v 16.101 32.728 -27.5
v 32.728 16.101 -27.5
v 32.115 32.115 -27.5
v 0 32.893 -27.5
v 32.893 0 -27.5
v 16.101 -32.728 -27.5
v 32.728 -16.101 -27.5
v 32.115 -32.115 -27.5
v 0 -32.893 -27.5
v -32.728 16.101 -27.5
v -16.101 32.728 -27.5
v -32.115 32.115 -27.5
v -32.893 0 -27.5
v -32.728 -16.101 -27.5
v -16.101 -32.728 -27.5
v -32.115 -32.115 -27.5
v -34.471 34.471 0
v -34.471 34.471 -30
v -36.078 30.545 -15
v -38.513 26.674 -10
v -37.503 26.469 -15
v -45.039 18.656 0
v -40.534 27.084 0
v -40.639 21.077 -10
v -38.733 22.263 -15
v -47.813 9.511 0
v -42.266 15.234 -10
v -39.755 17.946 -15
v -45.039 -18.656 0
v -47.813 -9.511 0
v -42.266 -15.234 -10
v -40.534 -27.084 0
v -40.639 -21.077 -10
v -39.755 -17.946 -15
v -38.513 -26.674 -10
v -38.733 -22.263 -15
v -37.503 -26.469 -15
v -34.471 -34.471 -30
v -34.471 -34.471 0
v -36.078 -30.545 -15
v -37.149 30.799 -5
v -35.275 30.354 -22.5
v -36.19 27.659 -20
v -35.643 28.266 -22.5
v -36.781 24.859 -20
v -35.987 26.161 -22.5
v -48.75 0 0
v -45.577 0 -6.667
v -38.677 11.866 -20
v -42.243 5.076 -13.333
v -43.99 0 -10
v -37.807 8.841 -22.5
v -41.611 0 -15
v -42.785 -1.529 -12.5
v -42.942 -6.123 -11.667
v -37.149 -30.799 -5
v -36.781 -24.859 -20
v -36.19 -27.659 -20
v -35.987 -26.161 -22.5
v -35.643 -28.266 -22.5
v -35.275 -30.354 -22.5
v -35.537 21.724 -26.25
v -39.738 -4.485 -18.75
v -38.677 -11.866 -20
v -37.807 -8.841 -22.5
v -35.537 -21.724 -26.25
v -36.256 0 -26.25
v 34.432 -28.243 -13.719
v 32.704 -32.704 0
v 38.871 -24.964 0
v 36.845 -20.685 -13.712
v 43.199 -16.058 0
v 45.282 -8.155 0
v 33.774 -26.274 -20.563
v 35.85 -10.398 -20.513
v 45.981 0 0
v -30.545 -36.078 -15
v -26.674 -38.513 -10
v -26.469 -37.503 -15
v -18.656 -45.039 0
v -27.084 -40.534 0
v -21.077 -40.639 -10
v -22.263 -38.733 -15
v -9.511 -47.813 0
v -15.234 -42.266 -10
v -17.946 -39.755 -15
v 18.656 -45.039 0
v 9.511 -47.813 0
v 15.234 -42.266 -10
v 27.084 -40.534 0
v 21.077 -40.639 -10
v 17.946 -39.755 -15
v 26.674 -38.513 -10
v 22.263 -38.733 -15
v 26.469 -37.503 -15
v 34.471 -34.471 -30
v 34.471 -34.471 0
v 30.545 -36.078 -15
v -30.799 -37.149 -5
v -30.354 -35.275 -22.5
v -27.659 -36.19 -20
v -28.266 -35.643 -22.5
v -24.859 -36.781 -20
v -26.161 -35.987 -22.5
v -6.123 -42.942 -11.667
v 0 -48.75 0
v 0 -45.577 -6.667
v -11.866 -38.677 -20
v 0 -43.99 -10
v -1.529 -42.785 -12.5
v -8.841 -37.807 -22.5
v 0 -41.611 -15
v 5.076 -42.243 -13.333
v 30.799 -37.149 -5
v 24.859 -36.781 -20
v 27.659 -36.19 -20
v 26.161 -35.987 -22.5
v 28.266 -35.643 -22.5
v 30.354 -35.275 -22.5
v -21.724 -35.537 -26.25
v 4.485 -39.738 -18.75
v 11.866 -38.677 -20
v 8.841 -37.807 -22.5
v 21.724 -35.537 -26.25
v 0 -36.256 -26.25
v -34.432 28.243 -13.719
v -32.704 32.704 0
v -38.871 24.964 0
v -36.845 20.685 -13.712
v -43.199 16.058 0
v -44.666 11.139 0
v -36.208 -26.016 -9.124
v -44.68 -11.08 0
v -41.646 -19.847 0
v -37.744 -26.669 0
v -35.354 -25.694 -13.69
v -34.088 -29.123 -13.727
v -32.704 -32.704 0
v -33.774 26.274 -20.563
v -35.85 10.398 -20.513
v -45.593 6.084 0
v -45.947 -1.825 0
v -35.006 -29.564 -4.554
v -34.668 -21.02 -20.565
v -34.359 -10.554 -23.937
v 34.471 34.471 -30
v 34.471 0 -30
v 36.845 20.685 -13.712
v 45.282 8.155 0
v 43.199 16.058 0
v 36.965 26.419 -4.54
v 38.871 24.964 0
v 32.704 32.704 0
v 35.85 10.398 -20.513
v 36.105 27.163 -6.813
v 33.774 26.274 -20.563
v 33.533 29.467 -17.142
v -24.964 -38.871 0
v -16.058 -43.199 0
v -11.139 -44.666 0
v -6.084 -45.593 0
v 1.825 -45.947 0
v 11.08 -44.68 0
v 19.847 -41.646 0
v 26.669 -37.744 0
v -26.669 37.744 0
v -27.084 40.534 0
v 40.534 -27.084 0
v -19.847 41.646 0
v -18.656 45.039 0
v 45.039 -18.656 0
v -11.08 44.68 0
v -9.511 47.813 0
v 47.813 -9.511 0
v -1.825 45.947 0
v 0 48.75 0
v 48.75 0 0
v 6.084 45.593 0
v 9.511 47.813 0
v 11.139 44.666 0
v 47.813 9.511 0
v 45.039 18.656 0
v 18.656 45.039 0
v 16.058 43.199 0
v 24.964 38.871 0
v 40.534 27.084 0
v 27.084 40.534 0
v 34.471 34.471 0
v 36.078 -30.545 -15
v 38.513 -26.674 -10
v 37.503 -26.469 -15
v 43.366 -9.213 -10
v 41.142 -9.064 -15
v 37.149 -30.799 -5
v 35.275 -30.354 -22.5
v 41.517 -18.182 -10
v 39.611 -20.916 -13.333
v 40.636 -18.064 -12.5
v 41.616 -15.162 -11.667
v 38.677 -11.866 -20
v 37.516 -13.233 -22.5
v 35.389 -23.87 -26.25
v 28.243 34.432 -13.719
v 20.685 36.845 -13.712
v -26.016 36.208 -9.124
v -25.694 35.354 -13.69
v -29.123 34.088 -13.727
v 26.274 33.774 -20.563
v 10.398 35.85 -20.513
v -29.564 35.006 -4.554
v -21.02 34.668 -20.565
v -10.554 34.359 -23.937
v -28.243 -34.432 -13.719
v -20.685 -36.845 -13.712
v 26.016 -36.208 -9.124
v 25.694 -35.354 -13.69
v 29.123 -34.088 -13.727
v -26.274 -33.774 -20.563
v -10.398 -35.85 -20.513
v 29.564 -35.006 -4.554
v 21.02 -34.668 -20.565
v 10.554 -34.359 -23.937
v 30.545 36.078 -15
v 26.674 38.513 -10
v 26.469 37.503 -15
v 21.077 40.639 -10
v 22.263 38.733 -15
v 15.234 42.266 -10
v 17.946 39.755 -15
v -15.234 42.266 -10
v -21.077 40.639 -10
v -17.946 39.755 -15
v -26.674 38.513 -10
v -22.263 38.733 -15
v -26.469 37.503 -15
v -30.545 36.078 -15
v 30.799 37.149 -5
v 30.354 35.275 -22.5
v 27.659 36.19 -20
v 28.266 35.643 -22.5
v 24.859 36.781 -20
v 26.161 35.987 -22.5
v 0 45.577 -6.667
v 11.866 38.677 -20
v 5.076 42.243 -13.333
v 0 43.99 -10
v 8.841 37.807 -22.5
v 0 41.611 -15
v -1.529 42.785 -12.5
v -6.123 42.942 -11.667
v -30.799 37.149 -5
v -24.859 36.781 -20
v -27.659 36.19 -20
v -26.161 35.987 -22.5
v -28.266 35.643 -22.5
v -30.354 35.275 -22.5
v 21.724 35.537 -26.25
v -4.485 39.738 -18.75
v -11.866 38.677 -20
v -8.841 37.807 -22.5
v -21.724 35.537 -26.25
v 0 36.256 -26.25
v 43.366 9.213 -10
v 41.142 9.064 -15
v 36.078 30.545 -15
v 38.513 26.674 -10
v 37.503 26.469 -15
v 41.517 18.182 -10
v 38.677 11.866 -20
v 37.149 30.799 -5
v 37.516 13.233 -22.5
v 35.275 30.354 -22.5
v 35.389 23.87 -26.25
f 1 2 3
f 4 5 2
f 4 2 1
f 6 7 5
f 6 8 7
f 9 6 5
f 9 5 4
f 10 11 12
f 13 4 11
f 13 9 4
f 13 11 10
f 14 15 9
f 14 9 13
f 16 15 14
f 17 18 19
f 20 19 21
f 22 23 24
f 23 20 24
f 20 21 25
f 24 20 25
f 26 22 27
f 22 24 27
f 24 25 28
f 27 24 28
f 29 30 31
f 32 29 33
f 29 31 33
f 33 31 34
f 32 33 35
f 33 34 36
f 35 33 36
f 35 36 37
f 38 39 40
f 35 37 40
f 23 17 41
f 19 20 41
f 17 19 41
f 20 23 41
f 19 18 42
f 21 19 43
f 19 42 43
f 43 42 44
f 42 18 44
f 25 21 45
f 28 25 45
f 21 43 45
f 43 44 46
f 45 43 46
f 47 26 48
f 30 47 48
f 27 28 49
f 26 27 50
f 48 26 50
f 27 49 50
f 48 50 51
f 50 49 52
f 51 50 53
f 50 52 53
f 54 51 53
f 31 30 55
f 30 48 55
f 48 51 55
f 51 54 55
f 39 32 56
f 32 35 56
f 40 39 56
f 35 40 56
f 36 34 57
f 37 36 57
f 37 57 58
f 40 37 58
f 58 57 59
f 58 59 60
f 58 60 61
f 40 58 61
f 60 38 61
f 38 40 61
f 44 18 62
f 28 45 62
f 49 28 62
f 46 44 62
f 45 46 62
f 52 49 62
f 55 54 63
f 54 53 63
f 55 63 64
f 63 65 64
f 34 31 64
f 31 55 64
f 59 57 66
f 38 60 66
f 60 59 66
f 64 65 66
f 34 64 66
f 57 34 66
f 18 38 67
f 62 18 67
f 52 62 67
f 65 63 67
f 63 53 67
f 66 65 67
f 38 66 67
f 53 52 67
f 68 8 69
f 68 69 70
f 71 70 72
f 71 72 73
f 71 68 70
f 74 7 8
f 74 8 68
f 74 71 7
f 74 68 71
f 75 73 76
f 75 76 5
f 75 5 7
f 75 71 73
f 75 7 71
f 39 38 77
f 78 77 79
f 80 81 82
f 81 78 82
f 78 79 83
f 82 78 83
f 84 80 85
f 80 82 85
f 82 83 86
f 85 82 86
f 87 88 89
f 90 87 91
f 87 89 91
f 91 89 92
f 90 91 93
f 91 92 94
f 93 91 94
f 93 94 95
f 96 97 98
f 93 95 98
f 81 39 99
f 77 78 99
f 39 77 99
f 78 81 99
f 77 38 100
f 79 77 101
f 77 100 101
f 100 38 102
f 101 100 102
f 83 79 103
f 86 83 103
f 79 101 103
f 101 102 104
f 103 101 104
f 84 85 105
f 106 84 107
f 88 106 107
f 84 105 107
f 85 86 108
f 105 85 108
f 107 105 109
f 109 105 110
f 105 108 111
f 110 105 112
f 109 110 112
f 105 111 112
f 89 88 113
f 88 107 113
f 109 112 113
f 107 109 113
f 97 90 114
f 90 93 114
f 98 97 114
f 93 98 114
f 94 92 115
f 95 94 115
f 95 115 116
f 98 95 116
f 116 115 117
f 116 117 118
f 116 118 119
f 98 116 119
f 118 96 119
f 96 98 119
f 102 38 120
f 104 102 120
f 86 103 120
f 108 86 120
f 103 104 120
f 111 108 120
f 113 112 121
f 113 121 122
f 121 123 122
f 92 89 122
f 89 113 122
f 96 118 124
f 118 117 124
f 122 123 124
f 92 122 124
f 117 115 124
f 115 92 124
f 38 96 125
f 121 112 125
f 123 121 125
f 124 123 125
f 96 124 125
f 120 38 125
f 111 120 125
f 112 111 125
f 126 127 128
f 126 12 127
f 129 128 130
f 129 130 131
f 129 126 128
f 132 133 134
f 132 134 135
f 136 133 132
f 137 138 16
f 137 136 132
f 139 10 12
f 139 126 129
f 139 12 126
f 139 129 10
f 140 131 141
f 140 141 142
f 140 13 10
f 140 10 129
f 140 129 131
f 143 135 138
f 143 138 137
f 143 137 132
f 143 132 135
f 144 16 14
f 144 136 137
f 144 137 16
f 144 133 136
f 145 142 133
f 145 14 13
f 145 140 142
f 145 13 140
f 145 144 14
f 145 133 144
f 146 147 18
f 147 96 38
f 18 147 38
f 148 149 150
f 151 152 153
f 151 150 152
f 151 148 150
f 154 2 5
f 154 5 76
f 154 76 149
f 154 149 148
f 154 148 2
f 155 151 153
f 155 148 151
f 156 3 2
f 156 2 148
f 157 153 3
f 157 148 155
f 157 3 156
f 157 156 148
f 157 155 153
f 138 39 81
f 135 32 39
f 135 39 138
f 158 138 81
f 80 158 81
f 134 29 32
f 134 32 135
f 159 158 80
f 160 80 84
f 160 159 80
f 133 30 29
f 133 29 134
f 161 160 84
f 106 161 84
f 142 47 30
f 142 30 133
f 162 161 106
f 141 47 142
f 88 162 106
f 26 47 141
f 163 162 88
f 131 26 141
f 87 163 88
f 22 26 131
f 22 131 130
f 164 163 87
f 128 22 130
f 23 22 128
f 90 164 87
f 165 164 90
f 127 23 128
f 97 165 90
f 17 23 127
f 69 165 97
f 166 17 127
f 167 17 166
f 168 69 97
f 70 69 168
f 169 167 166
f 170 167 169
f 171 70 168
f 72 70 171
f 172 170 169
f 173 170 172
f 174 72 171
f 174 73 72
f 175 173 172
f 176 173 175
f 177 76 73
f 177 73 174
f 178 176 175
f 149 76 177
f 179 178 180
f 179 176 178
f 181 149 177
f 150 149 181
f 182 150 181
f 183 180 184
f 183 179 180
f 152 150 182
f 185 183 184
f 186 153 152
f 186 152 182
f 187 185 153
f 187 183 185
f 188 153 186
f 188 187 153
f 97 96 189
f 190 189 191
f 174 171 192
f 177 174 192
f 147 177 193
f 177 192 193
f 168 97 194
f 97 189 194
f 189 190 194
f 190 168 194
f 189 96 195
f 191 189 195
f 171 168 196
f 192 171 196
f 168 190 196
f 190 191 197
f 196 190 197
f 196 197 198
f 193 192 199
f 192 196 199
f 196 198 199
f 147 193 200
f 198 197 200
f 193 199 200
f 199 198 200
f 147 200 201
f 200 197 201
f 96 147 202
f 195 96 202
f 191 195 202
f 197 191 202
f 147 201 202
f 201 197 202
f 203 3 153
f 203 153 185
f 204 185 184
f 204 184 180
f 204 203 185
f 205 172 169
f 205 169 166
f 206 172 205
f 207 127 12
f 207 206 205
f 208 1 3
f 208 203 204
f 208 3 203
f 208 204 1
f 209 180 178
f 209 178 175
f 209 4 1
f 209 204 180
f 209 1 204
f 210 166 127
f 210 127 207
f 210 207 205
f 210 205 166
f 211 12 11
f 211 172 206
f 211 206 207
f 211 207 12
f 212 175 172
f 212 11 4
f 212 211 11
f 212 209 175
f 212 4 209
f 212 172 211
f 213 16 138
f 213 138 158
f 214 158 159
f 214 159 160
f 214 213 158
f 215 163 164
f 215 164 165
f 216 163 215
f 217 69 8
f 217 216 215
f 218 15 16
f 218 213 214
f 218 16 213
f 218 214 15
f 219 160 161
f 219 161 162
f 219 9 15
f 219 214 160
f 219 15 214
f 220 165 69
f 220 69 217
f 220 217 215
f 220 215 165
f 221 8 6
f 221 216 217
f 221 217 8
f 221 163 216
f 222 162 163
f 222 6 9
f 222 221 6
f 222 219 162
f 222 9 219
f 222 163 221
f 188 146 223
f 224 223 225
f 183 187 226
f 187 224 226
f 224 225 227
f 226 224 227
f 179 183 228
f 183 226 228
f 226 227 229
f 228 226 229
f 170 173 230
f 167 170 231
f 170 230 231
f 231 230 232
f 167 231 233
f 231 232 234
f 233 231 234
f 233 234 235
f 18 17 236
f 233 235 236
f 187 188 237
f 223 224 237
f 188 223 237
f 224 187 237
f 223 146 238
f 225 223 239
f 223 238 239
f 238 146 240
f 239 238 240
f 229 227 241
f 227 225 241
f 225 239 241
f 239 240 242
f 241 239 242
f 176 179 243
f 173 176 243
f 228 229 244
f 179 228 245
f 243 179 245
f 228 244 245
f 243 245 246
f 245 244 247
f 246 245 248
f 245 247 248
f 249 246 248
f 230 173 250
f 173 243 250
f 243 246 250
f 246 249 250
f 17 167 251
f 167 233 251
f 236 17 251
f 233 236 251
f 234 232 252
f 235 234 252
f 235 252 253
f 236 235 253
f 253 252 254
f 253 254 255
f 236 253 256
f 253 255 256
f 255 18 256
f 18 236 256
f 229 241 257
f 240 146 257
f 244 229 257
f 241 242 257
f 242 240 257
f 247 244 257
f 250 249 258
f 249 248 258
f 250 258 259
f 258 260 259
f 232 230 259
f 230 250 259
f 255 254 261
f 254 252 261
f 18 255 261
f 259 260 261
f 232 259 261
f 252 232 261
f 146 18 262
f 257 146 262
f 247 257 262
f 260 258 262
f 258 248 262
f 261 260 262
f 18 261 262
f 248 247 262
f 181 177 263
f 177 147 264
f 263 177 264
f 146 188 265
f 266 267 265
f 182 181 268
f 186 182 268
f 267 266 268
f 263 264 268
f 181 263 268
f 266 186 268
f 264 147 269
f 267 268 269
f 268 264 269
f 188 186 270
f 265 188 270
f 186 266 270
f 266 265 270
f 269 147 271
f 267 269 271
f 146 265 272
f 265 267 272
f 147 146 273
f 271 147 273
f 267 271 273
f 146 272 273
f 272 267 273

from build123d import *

# Parameters (mm, degrees)
F0_R = 48.75
F2_W = 68.9429111657
F2_H = 68.9429111657
F4_T = 2.5


# Not quite as in the source:
# - a shell that OpenCascade refuses in one call is made with other operations: the cavity is built on its own and cut out


with BuildPart() as f3:
    # F0 (on Top) → F3 section 0
    with BuildSketch(Plane.XY):
        Circle(F0_R)
    # F2 (on offset) → F3 section 1
    with BuildSketch(Plane.XY.offset(-30)):
        Rectangle(F2_W, F2_H)
    loft()

    # F4: shell of thickness 2.5, made by hand


with BuildPart() as f4_core1:
    # F4_t2: copy of F3
    add(f3.part)

    # the walls: a layer under each face that stays
    f4_faces = [f4_core1.faces().sort_by_distance(p)[0] for p in [
        (39.7552913915, 17.9457725576, -15),
        (0, 41.6107277896, -15),
        (-41.6107277896, 0, -15),
        (0, -41.6107277896, -15),
        (39.7552913915, -17.9457725576, -15),
        (0, 0, -30),
    ]]
    thicken(f4_faces, amount=-F4_T, mode=Mode.SUBTRACT)


with BuildPart() as f3_1:
    add(f3.part)

    # what is left inside the walls is the cavity
    f4_cavity = [f4_core1.part.solids().sort_by_distance(p)[0] for p in [
        (0, -15.327093, -0.025),
    ]]
    add(f4_cavity, mode=Mode.SUBTRACT)


solid = f3_1.part
